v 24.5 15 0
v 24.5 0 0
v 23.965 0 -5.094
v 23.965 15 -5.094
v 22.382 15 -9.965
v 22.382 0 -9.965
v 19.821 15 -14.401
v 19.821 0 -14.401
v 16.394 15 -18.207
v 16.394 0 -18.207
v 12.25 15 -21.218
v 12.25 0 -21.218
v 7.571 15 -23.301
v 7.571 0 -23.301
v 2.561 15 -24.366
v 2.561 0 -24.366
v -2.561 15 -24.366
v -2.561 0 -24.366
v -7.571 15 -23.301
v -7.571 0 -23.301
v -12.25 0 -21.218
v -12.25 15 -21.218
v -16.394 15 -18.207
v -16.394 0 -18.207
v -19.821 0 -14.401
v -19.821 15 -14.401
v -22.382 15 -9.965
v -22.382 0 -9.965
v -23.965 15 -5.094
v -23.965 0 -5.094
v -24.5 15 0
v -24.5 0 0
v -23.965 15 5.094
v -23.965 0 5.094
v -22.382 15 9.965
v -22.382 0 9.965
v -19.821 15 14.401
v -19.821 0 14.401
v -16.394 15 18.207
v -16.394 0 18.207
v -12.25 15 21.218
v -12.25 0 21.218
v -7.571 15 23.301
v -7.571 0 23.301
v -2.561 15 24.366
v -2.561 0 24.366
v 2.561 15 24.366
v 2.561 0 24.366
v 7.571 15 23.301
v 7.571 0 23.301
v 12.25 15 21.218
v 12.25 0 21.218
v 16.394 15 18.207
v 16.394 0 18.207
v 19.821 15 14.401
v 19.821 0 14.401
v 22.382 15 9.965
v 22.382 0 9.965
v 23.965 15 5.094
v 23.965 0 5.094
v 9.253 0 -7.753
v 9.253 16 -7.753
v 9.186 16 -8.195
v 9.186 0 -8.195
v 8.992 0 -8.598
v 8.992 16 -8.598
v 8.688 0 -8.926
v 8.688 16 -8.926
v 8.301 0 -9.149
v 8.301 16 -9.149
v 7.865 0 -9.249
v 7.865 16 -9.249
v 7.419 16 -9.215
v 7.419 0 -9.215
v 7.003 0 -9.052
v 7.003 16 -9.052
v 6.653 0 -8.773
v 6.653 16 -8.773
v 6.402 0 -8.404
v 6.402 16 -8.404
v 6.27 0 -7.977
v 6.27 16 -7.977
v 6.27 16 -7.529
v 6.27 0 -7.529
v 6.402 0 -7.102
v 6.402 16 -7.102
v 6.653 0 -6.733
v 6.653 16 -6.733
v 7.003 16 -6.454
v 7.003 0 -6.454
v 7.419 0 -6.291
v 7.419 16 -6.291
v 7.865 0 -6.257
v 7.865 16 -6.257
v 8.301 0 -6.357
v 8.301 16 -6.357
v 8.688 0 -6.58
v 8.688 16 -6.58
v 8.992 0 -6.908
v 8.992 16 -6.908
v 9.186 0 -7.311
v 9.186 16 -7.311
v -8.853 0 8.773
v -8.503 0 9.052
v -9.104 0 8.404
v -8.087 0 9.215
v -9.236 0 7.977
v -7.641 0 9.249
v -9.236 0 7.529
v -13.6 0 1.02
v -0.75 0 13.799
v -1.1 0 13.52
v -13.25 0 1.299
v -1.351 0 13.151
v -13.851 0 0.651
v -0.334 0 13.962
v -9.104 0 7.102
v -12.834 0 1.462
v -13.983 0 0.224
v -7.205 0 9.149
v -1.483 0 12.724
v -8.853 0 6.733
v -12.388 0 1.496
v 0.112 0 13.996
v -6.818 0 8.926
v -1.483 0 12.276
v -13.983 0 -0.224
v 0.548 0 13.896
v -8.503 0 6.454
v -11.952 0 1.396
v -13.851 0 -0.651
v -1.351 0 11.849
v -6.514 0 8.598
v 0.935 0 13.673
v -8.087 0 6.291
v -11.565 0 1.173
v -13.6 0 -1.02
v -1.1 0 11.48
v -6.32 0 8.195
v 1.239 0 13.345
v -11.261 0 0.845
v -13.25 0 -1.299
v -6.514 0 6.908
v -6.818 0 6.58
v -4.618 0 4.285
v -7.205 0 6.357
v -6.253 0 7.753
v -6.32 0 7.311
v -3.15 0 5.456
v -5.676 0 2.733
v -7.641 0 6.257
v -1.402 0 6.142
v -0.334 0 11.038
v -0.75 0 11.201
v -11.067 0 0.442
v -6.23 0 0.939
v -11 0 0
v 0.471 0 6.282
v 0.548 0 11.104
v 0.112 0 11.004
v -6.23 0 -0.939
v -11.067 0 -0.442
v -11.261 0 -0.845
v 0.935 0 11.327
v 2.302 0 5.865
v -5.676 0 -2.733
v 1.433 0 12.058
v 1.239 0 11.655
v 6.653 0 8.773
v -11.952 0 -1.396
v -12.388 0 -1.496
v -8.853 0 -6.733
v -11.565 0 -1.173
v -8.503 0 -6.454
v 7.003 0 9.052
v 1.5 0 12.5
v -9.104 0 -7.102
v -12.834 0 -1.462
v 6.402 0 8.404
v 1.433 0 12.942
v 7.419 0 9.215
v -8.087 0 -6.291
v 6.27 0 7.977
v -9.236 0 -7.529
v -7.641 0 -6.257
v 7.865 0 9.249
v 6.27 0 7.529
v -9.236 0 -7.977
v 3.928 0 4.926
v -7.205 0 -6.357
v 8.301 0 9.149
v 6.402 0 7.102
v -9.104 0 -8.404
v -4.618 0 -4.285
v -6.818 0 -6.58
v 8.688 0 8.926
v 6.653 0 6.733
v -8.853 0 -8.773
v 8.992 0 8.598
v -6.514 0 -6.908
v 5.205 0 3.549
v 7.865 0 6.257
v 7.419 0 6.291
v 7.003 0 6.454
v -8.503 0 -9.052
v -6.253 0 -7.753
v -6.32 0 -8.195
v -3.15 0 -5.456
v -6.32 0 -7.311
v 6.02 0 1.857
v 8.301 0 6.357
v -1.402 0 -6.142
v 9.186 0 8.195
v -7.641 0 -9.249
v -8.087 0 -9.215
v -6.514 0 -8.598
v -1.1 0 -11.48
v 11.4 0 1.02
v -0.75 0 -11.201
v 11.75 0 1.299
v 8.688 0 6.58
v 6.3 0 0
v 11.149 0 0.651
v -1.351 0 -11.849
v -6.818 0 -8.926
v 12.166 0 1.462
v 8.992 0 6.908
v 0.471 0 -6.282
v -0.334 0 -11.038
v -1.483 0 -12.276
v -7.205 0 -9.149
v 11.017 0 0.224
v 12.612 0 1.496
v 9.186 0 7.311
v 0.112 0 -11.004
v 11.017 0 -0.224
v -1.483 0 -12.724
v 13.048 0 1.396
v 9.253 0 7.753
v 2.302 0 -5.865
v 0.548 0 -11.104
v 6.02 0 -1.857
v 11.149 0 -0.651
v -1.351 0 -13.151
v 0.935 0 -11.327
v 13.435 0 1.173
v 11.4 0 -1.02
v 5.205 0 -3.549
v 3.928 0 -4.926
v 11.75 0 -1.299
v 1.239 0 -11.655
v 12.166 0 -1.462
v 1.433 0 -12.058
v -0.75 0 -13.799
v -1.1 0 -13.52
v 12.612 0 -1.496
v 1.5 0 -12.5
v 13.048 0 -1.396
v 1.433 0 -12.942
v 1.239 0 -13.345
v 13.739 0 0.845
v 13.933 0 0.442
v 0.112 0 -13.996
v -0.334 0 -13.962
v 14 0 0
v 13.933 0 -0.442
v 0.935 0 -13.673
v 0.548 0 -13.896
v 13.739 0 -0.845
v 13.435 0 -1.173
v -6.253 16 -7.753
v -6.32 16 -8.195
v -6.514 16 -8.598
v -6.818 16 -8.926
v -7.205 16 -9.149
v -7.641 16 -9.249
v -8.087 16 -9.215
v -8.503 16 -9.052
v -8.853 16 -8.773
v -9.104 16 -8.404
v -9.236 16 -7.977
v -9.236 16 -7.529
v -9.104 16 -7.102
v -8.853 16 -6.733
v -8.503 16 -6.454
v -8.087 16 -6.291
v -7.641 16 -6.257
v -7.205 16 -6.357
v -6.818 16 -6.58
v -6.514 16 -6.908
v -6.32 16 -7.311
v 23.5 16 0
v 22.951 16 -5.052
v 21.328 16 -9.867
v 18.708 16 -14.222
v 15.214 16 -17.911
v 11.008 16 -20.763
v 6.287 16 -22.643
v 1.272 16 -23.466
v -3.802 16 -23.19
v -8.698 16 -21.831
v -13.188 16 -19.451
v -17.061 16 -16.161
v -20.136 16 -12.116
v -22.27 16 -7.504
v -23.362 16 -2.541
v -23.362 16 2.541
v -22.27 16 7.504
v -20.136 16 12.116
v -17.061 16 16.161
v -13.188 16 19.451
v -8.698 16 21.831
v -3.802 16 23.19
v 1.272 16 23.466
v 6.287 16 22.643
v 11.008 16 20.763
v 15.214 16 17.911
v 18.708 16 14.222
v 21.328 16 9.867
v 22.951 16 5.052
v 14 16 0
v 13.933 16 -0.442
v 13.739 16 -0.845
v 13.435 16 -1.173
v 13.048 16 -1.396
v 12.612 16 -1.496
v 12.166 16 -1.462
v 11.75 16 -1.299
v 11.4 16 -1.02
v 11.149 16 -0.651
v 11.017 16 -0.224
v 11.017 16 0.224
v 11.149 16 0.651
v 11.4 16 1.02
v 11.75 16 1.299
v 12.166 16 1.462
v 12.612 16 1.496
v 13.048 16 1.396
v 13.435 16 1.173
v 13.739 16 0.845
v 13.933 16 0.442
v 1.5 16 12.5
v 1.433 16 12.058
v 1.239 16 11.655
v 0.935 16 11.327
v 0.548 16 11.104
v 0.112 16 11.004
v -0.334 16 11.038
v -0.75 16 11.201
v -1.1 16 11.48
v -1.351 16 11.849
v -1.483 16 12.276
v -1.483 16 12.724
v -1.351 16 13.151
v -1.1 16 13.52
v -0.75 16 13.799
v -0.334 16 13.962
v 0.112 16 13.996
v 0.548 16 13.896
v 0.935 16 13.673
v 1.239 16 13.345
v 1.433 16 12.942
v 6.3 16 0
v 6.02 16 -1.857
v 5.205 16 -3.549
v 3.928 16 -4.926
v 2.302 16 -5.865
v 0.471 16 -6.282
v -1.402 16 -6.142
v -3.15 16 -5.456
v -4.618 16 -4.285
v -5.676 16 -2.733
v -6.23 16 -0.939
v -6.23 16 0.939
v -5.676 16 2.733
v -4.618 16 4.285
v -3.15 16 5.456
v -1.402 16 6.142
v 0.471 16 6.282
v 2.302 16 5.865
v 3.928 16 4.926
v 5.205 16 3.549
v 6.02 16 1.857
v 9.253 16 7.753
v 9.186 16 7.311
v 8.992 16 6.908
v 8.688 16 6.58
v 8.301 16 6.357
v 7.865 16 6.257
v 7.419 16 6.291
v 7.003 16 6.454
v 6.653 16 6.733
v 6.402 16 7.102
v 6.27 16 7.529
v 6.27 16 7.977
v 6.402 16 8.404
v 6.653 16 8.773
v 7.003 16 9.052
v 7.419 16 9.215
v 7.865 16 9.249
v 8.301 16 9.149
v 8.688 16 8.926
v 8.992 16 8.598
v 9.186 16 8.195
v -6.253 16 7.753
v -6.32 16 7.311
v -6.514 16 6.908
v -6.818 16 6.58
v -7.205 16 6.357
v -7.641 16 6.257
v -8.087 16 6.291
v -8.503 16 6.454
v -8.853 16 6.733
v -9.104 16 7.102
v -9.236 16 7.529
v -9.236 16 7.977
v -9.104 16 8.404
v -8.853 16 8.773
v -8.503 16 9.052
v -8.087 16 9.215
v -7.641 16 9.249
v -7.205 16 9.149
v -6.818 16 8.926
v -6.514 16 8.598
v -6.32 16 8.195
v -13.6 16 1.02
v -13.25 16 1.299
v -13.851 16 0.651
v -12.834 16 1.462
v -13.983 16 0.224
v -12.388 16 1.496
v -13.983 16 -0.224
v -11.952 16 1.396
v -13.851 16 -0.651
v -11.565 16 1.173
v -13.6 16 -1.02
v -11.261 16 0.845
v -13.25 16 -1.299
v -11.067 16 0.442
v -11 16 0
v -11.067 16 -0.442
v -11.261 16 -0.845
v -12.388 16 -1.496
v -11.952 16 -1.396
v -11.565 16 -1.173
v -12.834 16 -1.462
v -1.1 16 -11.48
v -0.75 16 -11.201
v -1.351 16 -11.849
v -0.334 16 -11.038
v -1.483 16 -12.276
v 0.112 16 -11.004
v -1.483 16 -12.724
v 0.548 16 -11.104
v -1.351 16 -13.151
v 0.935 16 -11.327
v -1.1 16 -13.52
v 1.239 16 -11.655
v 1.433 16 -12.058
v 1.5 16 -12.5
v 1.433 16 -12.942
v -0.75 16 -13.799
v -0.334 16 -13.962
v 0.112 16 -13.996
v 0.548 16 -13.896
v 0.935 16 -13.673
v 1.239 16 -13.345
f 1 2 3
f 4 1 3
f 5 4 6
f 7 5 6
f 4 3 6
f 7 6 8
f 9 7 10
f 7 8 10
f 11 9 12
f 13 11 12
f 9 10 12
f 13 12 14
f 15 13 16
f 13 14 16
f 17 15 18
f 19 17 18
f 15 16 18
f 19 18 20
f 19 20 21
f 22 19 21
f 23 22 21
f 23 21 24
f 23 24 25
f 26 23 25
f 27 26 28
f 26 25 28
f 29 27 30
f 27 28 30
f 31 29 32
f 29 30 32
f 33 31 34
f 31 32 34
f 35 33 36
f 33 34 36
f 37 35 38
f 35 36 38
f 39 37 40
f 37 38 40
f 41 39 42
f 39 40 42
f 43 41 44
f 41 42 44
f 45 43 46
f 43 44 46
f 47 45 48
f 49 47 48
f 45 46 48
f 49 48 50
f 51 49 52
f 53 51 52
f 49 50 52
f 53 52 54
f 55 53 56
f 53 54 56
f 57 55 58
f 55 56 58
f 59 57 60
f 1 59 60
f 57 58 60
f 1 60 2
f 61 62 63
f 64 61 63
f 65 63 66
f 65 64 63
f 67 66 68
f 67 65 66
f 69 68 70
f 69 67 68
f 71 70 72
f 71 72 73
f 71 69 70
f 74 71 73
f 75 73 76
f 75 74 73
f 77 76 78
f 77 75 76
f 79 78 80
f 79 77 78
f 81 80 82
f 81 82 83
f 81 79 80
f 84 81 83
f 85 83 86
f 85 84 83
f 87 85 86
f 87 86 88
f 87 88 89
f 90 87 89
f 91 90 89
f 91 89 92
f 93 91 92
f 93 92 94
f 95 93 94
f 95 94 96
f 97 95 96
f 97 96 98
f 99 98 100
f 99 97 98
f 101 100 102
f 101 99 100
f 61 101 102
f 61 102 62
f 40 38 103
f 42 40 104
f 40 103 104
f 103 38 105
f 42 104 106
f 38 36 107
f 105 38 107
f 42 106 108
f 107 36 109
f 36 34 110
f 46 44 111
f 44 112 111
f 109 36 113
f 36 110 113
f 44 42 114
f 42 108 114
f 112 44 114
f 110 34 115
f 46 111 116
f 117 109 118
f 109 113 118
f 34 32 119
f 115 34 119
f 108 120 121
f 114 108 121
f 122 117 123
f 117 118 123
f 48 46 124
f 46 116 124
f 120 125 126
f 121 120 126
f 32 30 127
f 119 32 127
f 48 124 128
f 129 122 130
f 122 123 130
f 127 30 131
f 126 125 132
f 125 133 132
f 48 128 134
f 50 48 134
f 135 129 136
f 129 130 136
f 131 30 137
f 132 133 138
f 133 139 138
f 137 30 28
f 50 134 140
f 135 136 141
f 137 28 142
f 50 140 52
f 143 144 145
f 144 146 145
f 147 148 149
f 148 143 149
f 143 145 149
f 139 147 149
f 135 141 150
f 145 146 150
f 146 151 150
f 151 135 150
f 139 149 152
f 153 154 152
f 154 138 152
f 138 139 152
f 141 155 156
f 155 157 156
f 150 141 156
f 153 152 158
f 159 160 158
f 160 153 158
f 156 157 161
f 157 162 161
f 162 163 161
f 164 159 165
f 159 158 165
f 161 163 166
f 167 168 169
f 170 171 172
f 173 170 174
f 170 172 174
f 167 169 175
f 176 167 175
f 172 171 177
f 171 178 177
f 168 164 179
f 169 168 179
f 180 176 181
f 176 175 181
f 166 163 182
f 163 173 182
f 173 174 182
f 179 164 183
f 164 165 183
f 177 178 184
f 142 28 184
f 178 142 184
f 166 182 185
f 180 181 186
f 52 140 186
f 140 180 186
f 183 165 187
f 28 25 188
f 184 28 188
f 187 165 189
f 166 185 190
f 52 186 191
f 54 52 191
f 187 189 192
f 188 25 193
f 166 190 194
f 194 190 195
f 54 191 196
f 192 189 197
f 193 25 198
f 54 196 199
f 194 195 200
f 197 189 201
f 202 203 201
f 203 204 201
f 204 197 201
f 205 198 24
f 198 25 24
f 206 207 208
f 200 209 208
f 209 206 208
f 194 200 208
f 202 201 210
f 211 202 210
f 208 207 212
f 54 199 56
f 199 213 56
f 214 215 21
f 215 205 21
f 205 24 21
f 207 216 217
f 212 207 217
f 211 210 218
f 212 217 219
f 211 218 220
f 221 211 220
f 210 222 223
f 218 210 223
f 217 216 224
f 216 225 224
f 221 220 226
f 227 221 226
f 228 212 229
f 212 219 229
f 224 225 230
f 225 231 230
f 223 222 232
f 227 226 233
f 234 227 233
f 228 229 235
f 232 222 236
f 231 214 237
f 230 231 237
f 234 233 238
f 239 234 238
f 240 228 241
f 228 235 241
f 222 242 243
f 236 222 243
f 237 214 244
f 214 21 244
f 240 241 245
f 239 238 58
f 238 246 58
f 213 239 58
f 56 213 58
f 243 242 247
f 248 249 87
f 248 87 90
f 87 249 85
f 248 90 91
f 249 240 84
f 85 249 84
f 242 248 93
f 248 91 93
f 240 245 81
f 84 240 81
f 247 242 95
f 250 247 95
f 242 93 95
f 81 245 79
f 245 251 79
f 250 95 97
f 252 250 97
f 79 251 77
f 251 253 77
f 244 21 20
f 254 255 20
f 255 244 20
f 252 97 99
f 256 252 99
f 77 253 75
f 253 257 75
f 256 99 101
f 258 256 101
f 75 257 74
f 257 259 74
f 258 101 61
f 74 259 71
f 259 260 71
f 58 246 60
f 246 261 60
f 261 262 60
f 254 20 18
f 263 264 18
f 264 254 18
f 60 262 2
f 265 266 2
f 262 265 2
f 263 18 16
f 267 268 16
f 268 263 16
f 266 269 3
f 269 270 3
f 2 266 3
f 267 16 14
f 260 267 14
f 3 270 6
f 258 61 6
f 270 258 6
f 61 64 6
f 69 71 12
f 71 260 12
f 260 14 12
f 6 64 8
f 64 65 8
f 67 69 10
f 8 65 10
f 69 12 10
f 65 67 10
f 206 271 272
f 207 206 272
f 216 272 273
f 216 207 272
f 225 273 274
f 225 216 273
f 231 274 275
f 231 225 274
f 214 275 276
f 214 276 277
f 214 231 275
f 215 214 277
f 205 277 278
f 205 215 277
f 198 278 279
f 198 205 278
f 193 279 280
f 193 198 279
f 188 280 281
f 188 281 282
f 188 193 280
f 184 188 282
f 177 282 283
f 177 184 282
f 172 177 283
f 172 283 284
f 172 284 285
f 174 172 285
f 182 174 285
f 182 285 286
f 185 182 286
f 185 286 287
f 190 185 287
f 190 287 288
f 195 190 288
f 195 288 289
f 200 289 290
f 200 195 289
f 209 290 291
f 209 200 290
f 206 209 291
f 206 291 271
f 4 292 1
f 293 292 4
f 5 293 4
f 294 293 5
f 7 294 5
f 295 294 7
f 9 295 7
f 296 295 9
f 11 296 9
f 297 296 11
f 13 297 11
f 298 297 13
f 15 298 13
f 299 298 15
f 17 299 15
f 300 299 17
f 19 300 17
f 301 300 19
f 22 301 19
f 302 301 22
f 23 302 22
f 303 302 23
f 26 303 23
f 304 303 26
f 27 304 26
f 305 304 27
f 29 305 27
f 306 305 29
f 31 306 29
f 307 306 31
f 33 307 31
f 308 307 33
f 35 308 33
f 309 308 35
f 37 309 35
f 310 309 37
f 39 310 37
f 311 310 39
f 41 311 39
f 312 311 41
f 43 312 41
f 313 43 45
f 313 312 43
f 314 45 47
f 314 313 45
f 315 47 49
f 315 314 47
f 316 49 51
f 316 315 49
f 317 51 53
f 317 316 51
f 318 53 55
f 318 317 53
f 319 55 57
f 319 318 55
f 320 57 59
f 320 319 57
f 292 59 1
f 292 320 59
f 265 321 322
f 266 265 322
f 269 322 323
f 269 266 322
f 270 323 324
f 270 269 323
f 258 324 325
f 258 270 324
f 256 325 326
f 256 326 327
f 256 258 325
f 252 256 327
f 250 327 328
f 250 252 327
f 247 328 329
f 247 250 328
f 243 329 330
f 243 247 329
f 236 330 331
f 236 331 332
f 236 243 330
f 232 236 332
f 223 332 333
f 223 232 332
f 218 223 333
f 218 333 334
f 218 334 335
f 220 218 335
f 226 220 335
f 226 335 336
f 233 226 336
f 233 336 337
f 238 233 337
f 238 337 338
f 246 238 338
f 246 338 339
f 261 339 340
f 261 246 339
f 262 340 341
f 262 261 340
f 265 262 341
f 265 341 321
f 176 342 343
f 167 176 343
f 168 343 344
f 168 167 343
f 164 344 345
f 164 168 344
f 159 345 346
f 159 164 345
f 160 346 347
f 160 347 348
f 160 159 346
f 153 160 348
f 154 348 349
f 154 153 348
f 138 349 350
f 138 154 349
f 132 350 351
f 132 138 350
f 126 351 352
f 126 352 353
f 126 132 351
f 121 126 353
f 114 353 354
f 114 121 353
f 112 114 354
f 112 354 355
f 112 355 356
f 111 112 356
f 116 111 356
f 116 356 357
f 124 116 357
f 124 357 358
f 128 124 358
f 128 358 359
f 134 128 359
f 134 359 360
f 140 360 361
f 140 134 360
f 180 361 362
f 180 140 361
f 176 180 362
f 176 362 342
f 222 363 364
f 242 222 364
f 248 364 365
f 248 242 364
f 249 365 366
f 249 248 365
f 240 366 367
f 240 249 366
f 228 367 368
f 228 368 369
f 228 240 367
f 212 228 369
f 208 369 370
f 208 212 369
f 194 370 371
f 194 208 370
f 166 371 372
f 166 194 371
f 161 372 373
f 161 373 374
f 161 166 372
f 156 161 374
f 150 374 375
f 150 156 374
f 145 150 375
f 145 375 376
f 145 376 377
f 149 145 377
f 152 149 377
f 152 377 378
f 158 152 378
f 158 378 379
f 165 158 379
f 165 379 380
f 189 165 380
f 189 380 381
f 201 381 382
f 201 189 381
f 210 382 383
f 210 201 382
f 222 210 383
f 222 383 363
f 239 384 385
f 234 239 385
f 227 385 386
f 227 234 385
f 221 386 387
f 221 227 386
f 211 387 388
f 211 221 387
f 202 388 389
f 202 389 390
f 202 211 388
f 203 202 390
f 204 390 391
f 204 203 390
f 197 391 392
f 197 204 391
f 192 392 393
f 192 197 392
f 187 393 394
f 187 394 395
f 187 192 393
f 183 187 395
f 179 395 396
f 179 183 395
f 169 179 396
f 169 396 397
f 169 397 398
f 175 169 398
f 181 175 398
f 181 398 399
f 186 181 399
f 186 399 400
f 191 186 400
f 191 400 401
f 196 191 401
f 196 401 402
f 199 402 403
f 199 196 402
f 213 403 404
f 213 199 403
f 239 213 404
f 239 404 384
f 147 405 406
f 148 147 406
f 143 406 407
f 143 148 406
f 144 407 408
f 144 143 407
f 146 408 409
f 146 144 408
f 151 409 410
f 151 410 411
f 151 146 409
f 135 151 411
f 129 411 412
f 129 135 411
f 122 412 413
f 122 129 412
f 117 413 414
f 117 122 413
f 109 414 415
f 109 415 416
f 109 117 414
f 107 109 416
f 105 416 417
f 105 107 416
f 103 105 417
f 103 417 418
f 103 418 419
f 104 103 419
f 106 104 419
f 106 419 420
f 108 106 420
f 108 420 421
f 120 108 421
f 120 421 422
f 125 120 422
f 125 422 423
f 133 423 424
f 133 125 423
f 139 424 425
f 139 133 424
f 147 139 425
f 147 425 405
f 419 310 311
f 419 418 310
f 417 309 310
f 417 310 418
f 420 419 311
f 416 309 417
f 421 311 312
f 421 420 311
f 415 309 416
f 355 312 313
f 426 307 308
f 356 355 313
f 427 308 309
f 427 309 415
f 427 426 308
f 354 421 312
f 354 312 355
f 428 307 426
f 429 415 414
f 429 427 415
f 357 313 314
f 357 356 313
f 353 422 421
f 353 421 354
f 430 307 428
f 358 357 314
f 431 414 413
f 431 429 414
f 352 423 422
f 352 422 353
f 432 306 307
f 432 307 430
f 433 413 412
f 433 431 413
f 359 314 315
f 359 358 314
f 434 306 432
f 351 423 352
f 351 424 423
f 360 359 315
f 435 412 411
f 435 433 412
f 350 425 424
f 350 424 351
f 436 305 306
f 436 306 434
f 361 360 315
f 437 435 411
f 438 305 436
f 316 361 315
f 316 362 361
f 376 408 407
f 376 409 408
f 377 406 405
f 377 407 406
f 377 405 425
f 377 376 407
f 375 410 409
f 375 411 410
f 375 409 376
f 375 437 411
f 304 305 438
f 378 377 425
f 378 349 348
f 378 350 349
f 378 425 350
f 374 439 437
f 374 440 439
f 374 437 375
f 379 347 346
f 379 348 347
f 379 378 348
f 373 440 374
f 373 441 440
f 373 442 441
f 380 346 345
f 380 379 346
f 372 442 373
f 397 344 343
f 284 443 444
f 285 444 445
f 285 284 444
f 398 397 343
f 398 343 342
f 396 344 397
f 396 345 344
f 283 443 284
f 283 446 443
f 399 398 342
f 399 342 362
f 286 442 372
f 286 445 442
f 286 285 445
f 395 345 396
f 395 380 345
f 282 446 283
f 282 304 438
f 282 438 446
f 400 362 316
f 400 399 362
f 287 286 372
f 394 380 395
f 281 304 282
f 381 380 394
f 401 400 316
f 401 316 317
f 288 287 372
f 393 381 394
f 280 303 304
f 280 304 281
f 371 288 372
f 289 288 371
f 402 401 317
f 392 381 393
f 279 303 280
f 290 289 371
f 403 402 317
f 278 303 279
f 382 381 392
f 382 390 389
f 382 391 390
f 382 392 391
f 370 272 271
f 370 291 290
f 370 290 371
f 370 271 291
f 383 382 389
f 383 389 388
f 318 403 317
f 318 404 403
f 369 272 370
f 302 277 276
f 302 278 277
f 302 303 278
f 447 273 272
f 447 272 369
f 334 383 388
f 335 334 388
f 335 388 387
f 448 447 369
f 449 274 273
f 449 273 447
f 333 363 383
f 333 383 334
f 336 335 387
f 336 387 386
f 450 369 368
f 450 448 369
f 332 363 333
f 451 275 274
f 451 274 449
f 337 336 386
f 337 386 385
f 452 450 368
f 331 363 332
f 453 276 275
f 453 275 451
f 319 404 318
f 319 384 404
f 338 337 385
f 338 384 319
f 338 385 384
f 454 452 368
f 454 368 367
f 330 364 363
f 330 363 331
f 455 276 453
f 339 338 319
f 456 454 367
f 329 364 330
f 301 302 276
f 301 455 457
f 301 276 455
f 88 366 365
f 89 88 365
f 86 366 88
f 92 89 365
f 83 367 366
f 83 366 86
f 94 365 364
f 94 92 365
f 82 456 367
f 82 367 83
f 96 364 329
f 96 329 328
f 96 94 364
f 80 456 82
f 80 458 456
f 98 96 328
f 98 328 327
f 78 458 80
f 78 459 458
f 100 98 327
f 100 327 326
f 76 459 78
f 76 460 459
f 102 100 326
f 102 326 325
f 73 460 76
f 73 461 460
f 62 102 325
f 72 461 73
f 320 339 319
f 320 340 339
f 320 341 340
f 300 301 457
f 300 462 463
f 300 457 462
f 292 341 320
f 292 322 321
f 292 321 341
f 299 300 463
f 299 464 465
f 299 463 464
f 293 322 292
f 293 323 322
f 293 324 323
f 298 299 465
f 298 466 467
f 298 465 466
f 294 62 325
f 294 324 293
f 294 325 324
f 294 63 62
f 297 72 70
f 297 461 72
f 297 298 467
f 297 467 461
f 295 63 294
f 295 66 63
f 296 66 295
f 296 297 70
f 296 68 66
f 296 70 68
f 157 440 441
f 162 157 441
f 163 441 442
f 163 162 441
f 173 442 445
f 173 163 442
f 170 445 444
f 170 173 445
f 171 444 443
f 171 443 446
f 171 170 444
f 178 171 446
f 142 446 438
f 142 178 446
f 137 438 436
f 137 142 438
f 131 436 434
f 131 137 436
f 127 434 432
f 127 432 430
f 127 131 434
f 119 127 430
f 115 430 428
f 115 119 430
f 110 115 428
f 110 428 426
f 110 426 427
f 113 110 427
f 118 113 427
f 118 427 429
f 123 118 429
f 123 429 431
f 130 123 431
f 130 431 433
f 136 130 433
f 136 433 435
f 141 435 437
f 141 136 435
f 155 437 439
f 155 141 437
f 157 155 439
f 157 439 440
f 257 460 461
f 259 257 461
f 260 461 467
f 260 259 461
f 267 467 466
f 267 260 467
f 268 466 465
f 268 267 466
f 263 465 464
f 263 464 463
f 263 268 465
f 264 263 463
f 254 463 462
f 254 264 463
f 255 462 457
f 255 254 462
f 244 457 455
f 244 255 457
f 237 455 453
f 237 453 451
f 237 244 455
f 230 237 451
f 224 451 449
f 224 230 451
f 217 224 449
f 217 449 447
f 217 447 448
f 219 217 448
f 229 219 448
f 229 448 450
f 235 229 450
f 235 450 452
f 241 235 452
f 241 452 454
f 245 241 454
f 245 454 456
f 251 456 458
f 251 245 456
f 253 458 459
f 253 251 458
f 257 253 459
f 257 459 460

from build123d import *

# Parameters (mm, degrees)
ESQUISSE1_R        = 24.5
ESQUISSE1_R_2      = 1.5
ESQUISSE1_R_3      = 6.3
BOSS_EXTRU_1_DEPTH = 16
CHANFREIN1_SIZE    = 1


with BuildPart() as part:
    # Esquisse1 → Boss.-Extru.1 (new body)
    with BuildSketch(Plane(origin=(0, 0, 0), x_dir=(1, 0, 0), z_dir=(0, 1, 0))):
        Circle(ESQUISSE1_R)
        with Locations((0, 12.5)):
            Circle(ESQUISSE1_R_2, mode=Mode.SUBTRACT)
        with Locations((12.5, 0)):
            Circle(ESQUISSE1_R_2, mode=Mode.SUBTRACT)
        with Locations((0, -12.5)):
            Circle(ESQUISSE1_R_2, mode=Mode.SUBTRACT)
        with Locations((-12.5, 0)):
            Circle(ESQUISSE1_R_2, mode=Mode.SUBTRACT)
        with Locations((7.753017526, 7.753017526)):
            Circle(ESQUISSE1_R_2, mode=Mode.SUBTRACT)
        with Locations((7.753017526, -7.753017526)):
            Circle(ESQUISSE1_R_2, mode=Mode.SUBTRACT)
        with Locations((-7.753017526, -7.753017526)):
            Circle(ESQUISSE1_R_2, mode=Mode.SUBTRACT)
        with Locations((-7.753017526, 7.753017526)):
            Circle(ESQUISSE1_R_2, mode=Mode.SUBTRACT)
        Circle(ESQUISSE1_R_3, mode=Mode.SUBTRACT)
    extrude(amount=BOSS_EXTRU_1_DEPTH)

    # Chanfrein1
    chanfrein1_edges = [part.edges().sort_by_distance(p)[0] for p in [
        (-24.5, 16, 0),
    ]]
    chamfer(chanfrein1_edges, length=CHANFREIN1_SIZE)


solid = part.part
